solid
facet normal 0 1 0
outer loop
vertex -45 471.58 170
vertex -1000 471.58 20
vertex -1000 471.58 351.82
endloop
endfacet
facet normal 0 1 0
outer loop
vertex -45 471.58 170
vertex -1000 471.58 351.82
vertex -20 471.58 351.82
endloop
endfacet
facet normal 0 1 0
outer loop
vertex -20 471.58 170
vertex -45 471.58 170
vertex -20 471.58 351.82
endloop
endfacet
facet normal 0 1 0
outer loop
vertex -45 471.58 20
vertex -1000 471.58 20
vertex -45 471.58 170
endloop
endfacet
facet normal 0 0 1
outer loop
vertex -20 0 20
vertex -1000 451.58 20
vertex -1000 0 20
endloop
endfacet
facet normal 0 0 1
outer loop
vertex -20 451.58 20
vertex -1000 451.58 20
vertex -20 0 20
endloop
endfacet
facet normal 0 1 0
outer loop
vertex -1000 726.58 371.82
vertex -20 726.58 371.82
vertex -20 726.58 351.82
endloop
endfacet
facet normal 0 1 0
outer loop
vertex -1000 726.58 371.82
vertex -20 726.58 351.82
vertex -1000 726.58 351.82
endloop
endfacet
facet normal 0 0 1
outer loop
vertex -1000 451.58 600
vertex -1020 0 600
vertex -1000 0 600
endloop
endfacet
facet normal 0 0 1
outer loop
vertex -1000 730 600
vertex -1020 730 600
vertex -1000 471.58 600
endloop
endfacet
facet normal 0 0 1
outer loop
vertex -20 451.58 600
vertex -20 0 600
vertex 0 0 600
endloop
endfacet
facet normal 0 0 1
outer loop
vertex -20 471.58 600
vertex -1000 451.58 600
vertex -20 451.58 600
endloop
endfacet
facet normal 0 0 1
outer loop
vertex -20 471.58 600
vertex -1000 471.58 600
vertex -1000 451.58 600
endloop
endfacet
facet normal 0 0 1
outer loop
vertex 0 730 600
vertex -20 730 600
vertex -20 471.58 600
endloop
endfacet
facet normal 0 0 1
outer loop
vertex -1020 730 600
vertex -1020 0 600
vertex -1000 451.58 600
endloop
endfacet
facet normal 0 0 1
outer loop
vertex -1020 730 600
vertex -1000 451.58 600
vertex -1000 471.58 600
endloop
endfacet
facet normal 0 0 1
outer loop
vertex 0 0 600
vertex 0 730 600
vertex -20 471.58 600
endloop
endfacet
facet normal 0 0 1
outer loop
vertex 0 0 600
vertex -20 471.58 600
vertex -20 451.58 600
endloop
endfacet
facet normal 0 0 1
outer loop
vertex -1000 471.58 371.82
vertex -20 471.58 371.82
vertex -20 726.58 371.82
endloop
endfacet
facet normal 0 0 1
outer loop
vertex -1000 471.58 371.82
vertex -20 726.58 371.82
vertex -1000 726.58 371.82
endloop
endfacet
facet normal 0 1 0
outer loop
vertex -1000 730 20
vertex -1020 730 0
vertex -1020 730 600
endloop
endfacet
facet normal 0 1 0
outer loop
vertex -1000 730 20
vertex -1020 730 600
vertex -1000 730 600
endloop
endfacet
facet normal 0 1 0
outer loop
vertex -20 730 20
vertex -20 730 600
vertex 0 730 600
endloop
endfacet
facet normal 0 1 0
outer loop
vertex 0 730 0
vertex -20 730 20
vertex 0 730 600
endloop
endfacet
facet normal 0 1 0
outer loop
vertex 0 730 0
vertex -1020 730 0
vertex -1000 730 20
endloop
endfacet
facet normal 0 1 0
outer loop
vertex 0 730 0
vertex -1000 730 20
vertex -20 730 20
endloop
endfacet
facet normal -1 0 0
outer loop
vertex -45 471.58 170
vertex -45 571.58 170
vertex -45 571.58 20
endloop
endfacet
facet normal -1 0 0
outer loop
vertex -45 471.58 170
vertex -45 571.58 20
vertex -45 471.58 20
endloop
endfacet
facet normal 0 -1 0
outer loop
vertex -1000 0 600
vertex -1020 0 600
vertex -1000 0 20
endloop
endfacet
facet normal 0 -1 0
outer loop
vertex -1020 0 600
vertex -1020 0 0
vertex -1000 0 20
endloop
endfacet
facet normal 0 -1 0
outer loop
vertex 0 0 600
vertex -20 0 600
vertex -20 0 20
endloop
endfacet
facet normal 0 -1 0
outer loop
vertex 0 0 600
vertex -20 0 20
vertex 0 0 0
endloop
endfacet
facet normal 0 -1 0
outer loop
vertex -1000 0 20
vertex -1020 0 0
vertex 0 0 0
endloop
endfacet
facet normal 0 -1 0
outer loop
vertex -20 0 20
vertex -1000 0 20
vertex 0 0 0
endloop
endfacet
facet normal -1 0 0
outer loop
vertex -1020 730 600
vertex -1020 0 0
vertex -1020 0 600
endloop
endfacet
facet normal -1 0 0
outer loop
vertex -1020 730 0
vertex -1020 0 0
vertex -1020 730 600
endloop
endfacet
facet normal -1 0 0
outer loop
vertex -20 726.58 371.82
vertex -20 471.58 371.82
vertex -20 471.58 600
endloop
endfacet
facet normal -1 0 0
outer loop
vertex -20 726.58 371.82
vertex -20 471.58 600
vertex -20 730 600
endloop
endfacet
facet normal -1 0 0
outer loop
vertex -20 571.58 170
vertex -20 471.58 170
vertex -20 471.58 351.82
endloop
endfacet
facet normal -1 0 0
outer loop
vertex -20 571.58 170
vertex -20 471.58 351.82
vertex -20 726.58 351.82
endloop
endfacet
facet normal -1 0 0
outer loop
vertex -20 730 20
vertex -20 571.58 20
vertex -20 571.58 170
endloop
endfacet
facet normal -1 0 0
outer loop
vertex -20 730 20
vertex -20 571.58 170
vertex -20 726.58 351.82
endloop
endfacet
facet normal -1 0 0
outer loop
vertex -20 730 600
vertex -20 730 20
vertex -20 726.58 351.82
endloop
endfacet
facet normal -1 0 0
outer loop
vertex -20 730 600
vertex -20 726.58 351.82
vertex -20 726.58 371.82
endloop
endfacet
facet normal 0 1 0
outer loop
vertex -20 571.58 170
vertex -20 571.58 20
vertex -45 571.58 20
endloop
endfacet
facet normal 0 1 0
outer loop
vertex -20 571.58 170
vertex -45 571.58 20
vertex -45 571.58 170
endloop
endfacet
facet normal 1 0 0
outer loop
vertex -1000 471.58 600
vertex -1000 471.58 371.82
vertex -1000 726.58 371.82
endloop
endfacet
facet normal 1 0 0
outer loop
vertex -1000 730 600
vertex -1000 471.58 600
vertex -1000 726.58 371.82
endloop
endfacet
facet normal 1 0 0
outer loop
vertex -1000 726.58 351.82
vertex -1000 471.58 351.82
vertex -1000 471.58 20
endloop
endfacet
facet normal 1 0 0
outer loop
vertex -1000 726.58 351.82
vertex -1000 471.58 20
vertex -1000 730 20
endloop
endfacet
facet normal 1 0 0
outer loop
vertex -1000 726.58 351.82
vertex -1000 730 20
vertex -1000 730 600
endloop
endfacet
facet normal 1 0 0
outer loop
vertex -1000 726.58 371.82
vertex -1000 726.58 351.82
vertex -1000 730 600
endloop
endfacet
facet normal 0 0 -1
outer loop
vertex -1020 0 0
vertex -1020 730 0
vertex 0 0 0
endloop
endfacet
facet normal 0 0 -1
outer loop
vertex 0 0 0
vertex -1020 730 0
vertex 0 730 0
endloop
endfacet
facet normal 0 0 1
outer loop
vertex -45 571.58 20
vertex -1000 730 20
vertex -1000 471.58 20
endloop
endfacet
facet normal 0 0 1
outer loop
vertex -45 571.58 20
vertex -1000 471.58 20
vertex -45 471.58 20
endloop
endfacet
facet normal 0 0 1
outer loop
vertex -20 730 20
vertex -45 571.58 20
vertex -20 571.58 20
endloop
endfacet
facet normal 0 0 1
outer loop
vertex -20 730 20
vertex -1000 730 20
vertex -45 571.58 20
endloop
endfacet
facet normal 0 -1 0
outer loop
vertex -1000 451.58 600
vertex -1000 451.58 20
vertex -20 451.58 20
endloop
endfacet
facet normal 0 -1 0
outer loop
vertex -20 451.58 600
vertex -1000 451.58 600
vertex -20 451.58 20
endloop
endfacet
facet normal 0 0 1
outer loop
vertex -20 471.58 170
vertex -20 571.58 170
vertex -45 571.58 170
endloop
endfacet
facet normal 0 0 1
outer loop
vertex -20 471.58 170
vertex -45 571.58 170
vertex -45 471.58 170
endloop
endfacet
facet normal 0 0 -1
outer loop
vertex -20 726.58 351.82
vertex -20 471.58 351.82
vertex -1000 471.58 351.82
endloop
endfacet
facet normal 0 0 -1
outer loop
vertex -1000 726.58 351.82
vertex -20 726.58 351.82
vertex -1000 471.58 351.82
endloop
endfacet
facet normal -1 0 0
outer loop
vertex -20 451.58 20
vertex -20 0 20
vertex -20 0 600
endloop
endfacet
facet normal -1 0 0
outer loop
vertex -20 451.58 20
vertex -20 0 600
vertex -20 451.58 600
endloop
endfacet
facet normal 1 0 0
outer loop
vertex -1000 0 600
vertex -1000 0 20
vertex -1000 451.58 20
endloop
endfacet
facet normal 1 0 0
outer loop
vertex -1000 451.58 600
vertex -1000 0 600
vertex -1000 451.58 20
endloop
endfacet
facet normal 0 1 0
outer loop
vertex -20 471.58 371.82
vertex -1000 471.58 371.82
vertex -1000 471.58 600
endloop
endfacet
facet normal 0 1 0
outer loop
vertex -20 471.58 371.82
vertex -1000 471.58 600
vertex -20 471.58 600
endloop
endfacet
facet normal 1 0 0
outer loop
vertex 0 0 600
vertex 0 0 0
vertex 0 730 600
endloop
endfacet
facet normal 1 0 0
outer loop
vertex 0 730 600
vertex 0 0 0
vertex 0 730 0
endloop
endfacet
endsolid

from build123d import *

# Parameters (mm, degrees)
F0_W      = 1020
F0_H      = 730
F1_DEPTH  = 20
F2_W      = 20
F2_H      = 730
F3_DEPTH  = 580
F4_W      = 20
F4_H      = 730
F5_DEPTH  = 580
F6_W      = 980
F6_H      = 20
F7_DEPTH  = 580
F8_W      = 980
F8_H      = 20
F9_DEPTH  = 255
F10_W     = 100
F10_H     = 150
F11_DEPTH = 25


with BuildPart() as f1:
    # F0 (on Top) → F1 (new body)
    with BuildSketch(Plane.XY):
        with Locations((-510, 365)):
            Rectangle(F0_W, F0_H)
    extrude(amount=F1_DEPTH)

    # F2 (on face) → F3 (join)
    with BuildSketch(Plane.XY.offset(20)):
        with Locations((-10, 365)):
            Rectangle(F2_W, F2_H)
    extrude(amount=F3_DEPTH)

    # F4 (on face) → F5 (join)
    with BuildSketch(Plane.XY.offset(20)):
        with Locations((-1010, 365)):
            Rectangle(F4_W, F4_H)
    extrude(amount=F5_DEPTH)

    # F6 (on face) → F7 (join)
    with BuildSketch(Plane.XY.offset(20)):
        with Locations((-510, 461.57975)):
            Rectangle(F6_W, F6_H)
    extrude(amount=F7_DEPTH)

    # F8 (on face) → F9 (join)
    with BuildSketch(Plane(origin=(0, 471.57975, 0), x_dir=(-1, 0, 0), z_dir=(0, 1, 0))):
        with Locations((510, 361.820499)):
            Rectangle(F8_W, F8_H)
    extrude(amount=F9_DEPTH)

    # F10 (on face) → F11 (join)
    with BuildSketch(Plane(origin=(-20, 0, 0), x_dir=(0, -1, 0), z_dir=(-1, 0, 0))):
        with Locations((-521.57975, 95)):
            Rectangle(F10_W, F10_H)
    extrude(amount=F11_DEPTH)


solid = f1.part
